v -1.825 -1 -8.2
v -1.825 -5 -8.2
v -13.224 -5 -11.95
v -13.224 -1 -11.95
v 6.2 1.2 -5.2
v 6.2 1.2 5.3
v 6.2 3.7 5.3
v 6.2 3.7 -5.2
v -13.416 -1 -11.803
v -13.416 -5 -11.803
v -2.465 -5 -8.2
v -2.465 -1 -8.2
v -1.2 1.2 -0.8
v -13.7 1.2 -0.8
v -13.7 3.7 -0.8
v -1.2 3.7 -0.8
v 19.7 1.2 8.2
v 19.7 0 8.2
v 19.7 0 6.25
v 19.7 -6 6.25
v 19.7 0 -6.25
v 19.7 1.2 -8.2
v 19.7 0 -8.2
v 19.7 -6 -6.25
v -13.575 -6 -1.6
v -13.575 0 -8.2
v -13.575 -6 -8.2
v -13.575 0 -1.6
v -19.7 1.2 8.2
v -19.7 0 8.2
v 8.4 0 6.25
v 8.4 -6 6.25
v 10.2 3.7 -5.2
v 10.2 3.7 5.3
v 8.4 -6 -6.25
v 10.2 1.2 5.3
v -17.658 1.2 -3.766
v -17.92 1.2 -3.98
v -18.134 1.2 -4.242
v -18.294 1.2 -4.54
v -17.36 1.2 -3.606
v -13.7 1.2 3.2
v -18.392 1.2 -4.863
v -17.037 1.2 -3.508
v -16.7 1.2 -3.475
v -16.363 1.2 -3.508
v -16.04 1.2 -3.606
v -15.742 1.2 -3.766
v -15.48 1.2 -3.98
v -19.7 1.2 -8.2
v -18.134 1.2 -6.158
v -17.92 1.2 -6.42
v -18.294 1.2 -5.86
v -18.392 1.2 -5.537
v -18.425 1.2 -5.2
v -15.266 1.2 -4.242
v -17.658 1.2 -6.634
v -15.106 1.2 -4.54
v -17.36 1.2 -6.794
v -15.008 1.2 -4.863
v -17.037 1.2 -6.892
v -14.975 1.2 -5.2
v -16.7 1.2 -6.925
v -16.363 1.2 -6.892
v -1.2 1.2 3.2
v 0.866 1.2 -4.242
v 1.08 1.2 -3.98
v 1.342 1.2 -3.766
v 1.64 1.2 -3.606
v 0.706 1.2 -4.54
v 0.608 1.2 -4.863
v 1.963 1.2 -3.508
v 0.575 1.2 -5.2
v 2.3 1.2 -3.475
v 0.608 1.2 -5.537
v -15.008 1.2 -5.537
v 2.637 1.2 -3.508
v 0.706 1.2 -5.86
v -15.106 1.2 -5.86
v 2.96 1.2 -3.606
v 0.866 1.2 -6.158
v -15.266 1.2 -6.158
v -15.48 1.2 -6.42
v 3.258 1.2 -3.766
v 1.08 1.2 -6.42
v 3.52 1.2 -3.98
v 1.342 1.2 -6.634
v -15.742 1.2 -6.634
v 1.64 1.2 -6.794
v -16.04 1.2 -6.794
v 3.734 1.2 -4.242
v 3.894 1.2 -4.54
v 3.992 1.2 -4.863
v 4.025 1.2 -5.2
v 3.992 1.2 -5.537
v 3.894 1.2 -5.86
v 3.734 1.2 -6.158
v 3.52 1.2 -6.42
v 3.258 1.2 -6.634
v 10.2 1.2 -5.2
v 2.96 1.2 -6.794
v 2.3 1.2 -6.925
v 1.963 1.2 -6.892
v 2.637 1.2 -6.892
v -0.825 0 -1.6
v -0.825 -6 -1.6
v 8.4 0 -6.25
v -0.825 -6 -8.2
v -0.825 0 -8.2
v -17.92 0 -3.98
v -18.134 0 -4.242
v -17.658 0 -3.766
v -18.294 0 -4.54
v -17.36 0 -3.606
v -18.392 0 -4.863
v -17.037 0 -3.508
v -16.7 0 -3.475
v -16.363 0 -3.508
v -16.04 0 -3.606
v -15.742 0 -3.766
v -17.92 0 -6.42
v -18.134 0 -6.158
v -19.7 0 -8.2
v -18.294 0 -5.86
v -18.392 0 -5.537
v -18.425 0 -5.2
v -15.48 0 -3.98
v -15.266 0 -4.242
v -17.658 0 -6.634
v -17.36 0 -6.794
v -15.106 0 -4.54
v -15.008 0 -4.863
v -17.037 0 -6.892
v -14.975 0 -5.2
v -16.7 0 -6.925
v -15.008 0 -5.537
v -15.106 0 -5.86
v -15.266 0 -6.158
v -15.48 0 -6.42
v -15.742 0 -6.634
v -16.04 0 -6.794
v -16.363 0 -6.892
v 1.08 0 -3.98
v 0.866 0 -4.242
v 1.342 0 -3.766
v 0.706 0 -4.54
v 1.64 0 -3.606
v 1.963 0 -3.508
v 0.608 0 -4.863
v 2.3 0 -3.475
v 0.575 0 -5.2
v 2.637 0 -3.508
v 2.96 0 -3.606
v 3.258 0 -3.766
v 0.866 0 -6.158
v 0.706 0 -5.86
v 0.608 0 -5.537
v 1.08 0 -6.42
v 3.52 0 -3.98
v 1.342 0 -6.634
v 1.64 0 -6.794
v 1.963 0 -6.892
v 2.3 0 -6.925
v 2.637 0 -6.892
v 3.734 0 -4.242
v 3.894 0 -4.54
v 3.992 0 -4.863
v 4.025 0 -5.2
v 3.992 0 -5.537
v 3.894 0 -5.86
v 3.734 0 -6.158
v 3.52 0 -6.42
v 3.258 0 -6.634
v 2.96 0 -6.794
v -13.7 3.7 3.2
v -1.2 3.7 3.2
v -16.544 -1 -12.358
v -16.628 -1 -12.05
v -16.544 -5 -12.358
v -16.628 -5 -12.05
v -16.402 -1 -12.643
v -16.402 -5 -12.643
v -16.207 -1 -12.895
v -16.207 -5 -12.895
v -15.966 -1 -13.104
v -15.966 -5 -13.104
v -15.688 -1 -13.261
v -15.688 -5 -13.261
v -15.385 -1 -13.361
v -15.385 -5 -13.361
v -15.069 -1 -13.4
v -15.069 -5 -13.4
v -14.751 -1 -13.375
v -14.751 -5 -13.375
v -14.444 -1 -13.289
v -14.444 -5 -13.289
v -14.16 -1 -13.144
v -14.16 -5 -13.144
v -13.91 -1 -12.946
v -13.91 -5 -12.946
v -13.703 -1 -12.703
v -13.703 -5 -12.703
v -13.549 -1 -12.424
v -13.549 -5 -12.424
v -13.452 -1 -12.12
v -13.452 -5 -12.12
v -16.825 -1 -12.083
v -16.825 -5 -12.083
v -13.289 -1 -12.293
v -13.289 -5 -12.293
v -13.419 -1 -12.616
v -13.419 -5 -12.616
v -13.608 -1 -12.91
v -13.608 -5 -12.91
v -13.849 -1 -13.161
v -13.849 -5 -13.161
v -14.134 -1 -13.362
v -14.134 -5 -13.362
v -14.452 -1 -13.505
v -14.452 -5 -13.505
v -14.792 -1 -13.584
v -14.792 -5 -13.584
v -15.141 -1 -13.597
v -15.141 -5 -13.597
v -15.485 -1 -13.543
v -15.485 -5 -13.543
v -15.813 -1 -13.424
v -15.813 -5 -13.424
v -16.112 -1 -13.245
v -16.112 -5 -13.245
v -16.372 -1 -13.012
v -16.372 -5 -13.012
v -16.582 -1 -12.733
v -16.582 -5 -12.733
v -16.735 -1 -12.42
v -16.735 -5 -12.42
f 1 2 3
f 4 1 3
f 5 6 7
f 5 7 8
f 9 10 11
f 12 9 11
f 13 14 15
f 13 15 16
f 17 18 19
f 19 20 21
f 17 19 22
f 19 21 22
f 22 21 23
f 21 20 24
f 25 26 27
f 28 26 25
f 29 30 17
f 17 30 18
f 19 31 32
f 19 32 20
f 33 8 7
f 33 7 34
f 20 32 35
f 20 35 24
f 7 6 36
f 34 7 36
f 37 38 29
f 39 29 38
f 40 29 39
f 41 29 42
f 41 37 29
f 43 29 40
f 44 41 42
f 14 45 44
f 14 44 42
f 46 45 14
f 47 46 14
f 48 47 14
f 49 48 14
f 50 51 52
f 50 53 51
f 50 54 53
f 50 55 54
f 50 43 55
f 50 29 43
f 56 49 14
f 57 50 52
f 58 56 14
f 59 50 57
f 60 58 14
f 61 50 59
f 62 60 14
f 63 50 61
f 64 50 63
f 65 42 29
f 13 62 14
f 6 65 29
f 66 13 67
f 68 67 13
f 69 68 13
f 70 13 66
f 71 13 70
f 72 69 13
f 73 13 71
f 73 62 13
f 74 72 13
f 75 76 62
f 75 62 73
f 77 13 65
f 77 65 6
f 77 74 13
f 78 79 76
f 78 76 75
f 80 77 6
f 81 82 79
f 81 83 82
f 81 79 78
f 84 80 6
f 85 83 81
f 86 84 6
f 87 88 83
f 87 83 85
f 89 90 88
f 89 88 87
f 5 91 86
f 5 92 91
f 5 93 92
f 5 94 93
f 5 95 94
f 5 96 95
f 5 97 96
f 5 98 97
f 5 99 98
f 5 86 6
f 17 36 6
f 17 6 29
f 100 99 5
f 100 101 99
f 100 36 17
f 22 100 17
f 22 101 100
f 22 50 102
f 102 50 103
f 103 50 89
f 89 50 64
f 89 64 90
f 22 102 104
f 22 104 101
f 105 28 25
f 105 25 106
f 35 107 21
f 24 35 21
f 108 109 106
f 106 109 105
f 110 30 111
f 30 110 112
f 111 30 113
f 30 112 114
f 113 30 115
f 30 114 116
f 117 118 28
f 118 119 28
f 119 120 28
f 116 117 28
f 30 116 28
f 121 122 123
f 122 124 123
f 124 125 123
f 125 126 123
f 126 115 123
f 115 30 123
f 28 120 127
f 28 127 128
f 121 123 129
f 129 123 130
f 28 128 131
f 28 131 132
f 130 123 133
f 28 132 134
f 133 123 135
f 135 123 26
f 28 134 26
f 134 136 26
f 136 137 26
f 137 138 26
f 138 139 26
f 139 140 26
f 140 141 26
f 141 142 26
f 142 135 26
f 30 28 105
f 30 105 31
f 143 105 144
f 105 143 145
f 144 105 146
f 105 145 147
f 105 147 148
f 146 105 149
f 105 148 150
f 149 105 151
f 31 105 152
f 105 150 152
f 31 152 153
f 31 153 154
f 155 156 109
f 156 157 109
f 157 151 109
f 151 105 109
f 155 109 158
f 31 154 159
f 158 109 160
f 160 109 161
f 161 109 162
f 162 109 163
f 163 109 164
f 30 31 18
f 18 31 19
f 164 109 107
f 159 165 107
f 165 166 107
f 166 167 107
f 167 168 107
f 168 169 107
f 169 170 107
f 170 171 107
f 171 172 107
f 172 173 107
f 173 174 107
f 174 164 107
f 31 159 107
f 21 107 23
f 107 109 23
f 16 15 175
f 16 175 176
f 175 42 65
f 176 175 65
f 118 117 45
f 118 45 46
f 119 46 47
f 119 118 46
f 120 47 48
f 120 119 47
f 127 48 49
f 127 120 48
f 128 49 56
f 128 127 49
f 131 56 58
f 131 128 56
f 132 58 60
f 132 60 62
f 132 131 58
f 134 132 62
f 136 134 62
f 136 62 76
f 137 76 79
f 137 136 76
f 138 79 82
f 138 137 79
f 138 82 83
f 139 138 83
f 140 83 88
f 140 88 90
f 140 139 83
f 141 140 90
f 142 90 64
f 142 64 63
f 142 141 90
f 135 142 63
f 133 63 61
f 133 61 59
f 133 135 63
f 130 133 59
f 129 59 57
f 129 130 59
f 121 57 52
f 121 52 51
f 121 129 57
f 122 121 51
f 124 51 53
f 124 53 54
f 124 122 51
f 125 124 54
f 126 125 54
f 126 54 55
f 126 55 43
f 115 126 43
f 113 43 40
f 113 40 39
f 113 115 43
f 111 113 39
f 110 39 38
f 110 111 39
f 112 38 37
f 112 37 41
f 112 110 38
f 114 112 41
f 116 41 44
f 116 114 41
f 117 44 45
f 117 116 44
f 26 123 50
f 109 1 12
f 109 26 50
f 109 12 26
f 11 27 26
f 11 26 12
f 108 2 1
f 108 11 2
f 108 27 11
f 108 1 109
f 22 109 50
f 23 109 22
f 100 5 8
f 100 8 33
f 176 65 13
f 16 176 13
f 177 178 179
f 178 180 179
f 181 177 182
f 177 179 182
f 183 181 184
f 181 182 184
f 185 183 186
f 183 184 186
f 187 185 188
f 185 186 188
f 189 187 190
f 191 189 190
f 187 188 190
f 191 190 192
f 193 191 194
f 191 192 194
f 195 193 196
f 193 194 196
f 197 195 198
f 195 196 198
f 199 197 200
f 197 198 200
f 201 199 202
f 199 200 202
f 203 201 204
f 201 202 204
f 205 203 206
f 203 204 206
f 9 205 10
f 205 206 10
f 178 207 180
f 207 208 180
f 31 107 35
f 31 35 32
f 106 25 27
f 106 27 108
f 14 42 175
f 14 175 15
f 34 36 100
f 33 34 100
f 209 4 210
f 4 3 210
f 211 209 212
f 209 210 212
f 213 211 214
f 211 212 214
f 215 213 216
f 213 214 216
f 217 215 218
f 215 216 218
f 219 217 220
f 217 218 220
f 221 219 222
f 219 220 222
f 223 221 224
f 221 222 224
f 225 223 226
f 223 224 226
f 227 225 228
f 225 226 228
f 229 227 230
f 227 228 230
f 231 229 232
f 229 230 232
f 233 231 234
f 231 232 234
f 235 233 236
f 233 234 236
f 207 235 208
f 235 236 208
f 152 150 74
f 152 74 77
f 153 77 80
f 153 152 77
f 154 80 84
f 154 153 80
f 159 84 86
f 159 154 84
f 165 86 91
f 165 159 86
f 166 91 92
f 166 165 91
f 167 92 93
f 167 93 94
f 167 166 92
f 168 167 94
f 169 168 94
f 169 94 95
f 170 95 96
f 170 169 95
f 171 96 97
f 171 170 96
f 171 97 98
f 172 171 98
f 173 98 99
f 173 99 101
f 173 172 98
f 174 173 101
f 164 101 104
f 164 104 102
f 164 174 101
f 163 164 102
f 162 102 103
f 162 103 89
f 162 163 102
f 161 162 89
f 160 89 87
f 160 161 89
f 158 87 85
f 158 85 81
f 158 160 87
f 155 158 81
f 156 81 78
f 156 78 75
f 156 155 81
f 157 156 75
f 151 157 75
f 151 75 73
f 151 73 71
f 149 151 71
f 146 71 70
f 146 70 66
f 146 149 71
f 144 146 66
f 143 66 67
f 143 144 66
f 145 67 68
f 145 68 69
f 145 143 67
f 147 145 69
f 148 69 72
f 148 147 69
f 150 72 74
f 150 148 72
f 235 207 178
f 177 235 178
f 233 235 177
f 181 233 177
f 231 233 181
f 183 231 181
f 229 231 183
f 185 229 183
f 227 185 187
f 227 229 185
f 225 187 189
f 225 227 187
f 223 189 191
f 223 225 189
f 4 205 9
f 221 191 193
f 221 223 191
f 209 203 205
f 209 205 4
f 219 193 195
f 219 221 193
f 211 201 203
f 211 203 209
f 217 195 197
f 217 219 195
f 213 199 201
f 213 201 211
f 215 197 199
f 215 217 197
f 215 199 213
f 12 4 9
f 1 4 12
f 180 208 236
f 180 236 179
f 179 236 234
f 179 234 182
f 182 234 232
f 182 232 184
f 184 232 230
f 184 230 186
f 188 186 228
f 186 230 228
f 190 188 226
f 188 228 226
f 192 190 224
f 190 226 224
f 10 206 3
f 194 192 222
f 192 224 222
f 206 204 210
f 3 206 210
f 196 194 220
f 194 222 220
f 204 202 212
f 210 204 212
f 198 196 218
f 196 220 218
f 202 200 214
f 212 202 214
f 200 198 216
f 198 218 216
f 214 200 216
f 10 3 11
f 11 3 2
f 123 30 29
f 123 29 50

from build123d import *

# Parameters (mm, degrees)
SKETCH1_W           = 39.4
SKETCH1_H           = 16.4
SKETCH1_R           = 1.725
BOSS_EXTRUDE1_DEPTH = 1.2
SKETCH2_W           = 12.5
SKETCH2_H           = 4
SKETCH2_W_2         = 4
SKETCH2_H_2         = 10.5
BOSS_EXTRUDE2_DEPTH = 2.5
SKETCH3_W           = 11.3
SKETCH3_H           = 12.5
SKETCH3_W_2         = 12.75
SKETCH3_H_2         = 6.6
BOSS_EXTRUDE3_DEPTH = 6
BOSS_EXTRUDE4_DEPTH = 2


with BuildPart() as part:
    # Sketch1 → Boss-Extrude1 (new body)
    with BuildSketch(Plane(origin=(0, 0, 0), x_dir=(1, 0, 0), z_dir=(0, 1, 0))):
        Rectangle(SKETCH1_W, SKETCH1_H)
        with Locations(Location((-16.7, 5.2, 0), (0, 0, 270))):
            Circle(SKETCH1_R, mode=Mode.SUBTRACT)
        with Locations(Location((2.3, 5.2, 0), (0, 0, 270))):
            Circle(SKETCH1_R, mode=Mode.SUBTRACT)
    extrude(amount=BOSS_EXTRUDE1_DEPTH)

    # Sketch2 → Boss-Extrude2 (add)
    with BuildSketch(Plane(origin=(0, 1.2, 0), x_dir=(1, 0, 0), z_dir=(0, 1, 0))):
        with Locations((-7.45, -1.2)):
            Rectangle(SKETCH2_W, SKETCH2_H)
        with Locations((8.2, -0.05)):
            Rectangle(SKETCH2_W_2, SKETCH2_H_2)
    extrude(amount=BOSS_EXTRUDE2_DEPTH)

    # Sketch3 → Boss-Extrude3 (add)
    with BuildSketch(Plane.XZ):
        with Locations((14.05, 0)):
            Rectangle(SKETCH3_W, SKETCH3_H)
        with Locations((-7.2, -4.9)):
            Rectangle(SKETCH3_W_2, SKETCH3_H_2)
    extrude(amount=BOSS_EXTRUDE3_DEPTH)

    # Sketch4 → Boss-Extrude4 (add, symmetric)
    with BuildSketch(Plane(origin=(0, -3, 0), x_dir=(-1, 0, 0), z_dir=(0, -1, 0))):
        with BuildLine():
            Line((1.825, 8.2), (13.224013115, 11.95))
            ThreePointArc((13.224013115, 11.95), (14.96605462, 13.598761551), (16.825, 12.083028945))
            Line((16.825, 12.083028945), (16.627742085, 12.050024171))
            ThreePointArc((16.627742085, 12.050024171), (14.909005352, 13.395228648), (13.416459603, 11.802765704))
            Line((13.416459603, 11.802765704), (2.465, 8.2))
            Line((2.465, 8.2), (1.825, 8.2))
        make_face()
    extrude(amount=BOSS_EXTRUDE4_DEPTH, both=True)


solid = part.part
